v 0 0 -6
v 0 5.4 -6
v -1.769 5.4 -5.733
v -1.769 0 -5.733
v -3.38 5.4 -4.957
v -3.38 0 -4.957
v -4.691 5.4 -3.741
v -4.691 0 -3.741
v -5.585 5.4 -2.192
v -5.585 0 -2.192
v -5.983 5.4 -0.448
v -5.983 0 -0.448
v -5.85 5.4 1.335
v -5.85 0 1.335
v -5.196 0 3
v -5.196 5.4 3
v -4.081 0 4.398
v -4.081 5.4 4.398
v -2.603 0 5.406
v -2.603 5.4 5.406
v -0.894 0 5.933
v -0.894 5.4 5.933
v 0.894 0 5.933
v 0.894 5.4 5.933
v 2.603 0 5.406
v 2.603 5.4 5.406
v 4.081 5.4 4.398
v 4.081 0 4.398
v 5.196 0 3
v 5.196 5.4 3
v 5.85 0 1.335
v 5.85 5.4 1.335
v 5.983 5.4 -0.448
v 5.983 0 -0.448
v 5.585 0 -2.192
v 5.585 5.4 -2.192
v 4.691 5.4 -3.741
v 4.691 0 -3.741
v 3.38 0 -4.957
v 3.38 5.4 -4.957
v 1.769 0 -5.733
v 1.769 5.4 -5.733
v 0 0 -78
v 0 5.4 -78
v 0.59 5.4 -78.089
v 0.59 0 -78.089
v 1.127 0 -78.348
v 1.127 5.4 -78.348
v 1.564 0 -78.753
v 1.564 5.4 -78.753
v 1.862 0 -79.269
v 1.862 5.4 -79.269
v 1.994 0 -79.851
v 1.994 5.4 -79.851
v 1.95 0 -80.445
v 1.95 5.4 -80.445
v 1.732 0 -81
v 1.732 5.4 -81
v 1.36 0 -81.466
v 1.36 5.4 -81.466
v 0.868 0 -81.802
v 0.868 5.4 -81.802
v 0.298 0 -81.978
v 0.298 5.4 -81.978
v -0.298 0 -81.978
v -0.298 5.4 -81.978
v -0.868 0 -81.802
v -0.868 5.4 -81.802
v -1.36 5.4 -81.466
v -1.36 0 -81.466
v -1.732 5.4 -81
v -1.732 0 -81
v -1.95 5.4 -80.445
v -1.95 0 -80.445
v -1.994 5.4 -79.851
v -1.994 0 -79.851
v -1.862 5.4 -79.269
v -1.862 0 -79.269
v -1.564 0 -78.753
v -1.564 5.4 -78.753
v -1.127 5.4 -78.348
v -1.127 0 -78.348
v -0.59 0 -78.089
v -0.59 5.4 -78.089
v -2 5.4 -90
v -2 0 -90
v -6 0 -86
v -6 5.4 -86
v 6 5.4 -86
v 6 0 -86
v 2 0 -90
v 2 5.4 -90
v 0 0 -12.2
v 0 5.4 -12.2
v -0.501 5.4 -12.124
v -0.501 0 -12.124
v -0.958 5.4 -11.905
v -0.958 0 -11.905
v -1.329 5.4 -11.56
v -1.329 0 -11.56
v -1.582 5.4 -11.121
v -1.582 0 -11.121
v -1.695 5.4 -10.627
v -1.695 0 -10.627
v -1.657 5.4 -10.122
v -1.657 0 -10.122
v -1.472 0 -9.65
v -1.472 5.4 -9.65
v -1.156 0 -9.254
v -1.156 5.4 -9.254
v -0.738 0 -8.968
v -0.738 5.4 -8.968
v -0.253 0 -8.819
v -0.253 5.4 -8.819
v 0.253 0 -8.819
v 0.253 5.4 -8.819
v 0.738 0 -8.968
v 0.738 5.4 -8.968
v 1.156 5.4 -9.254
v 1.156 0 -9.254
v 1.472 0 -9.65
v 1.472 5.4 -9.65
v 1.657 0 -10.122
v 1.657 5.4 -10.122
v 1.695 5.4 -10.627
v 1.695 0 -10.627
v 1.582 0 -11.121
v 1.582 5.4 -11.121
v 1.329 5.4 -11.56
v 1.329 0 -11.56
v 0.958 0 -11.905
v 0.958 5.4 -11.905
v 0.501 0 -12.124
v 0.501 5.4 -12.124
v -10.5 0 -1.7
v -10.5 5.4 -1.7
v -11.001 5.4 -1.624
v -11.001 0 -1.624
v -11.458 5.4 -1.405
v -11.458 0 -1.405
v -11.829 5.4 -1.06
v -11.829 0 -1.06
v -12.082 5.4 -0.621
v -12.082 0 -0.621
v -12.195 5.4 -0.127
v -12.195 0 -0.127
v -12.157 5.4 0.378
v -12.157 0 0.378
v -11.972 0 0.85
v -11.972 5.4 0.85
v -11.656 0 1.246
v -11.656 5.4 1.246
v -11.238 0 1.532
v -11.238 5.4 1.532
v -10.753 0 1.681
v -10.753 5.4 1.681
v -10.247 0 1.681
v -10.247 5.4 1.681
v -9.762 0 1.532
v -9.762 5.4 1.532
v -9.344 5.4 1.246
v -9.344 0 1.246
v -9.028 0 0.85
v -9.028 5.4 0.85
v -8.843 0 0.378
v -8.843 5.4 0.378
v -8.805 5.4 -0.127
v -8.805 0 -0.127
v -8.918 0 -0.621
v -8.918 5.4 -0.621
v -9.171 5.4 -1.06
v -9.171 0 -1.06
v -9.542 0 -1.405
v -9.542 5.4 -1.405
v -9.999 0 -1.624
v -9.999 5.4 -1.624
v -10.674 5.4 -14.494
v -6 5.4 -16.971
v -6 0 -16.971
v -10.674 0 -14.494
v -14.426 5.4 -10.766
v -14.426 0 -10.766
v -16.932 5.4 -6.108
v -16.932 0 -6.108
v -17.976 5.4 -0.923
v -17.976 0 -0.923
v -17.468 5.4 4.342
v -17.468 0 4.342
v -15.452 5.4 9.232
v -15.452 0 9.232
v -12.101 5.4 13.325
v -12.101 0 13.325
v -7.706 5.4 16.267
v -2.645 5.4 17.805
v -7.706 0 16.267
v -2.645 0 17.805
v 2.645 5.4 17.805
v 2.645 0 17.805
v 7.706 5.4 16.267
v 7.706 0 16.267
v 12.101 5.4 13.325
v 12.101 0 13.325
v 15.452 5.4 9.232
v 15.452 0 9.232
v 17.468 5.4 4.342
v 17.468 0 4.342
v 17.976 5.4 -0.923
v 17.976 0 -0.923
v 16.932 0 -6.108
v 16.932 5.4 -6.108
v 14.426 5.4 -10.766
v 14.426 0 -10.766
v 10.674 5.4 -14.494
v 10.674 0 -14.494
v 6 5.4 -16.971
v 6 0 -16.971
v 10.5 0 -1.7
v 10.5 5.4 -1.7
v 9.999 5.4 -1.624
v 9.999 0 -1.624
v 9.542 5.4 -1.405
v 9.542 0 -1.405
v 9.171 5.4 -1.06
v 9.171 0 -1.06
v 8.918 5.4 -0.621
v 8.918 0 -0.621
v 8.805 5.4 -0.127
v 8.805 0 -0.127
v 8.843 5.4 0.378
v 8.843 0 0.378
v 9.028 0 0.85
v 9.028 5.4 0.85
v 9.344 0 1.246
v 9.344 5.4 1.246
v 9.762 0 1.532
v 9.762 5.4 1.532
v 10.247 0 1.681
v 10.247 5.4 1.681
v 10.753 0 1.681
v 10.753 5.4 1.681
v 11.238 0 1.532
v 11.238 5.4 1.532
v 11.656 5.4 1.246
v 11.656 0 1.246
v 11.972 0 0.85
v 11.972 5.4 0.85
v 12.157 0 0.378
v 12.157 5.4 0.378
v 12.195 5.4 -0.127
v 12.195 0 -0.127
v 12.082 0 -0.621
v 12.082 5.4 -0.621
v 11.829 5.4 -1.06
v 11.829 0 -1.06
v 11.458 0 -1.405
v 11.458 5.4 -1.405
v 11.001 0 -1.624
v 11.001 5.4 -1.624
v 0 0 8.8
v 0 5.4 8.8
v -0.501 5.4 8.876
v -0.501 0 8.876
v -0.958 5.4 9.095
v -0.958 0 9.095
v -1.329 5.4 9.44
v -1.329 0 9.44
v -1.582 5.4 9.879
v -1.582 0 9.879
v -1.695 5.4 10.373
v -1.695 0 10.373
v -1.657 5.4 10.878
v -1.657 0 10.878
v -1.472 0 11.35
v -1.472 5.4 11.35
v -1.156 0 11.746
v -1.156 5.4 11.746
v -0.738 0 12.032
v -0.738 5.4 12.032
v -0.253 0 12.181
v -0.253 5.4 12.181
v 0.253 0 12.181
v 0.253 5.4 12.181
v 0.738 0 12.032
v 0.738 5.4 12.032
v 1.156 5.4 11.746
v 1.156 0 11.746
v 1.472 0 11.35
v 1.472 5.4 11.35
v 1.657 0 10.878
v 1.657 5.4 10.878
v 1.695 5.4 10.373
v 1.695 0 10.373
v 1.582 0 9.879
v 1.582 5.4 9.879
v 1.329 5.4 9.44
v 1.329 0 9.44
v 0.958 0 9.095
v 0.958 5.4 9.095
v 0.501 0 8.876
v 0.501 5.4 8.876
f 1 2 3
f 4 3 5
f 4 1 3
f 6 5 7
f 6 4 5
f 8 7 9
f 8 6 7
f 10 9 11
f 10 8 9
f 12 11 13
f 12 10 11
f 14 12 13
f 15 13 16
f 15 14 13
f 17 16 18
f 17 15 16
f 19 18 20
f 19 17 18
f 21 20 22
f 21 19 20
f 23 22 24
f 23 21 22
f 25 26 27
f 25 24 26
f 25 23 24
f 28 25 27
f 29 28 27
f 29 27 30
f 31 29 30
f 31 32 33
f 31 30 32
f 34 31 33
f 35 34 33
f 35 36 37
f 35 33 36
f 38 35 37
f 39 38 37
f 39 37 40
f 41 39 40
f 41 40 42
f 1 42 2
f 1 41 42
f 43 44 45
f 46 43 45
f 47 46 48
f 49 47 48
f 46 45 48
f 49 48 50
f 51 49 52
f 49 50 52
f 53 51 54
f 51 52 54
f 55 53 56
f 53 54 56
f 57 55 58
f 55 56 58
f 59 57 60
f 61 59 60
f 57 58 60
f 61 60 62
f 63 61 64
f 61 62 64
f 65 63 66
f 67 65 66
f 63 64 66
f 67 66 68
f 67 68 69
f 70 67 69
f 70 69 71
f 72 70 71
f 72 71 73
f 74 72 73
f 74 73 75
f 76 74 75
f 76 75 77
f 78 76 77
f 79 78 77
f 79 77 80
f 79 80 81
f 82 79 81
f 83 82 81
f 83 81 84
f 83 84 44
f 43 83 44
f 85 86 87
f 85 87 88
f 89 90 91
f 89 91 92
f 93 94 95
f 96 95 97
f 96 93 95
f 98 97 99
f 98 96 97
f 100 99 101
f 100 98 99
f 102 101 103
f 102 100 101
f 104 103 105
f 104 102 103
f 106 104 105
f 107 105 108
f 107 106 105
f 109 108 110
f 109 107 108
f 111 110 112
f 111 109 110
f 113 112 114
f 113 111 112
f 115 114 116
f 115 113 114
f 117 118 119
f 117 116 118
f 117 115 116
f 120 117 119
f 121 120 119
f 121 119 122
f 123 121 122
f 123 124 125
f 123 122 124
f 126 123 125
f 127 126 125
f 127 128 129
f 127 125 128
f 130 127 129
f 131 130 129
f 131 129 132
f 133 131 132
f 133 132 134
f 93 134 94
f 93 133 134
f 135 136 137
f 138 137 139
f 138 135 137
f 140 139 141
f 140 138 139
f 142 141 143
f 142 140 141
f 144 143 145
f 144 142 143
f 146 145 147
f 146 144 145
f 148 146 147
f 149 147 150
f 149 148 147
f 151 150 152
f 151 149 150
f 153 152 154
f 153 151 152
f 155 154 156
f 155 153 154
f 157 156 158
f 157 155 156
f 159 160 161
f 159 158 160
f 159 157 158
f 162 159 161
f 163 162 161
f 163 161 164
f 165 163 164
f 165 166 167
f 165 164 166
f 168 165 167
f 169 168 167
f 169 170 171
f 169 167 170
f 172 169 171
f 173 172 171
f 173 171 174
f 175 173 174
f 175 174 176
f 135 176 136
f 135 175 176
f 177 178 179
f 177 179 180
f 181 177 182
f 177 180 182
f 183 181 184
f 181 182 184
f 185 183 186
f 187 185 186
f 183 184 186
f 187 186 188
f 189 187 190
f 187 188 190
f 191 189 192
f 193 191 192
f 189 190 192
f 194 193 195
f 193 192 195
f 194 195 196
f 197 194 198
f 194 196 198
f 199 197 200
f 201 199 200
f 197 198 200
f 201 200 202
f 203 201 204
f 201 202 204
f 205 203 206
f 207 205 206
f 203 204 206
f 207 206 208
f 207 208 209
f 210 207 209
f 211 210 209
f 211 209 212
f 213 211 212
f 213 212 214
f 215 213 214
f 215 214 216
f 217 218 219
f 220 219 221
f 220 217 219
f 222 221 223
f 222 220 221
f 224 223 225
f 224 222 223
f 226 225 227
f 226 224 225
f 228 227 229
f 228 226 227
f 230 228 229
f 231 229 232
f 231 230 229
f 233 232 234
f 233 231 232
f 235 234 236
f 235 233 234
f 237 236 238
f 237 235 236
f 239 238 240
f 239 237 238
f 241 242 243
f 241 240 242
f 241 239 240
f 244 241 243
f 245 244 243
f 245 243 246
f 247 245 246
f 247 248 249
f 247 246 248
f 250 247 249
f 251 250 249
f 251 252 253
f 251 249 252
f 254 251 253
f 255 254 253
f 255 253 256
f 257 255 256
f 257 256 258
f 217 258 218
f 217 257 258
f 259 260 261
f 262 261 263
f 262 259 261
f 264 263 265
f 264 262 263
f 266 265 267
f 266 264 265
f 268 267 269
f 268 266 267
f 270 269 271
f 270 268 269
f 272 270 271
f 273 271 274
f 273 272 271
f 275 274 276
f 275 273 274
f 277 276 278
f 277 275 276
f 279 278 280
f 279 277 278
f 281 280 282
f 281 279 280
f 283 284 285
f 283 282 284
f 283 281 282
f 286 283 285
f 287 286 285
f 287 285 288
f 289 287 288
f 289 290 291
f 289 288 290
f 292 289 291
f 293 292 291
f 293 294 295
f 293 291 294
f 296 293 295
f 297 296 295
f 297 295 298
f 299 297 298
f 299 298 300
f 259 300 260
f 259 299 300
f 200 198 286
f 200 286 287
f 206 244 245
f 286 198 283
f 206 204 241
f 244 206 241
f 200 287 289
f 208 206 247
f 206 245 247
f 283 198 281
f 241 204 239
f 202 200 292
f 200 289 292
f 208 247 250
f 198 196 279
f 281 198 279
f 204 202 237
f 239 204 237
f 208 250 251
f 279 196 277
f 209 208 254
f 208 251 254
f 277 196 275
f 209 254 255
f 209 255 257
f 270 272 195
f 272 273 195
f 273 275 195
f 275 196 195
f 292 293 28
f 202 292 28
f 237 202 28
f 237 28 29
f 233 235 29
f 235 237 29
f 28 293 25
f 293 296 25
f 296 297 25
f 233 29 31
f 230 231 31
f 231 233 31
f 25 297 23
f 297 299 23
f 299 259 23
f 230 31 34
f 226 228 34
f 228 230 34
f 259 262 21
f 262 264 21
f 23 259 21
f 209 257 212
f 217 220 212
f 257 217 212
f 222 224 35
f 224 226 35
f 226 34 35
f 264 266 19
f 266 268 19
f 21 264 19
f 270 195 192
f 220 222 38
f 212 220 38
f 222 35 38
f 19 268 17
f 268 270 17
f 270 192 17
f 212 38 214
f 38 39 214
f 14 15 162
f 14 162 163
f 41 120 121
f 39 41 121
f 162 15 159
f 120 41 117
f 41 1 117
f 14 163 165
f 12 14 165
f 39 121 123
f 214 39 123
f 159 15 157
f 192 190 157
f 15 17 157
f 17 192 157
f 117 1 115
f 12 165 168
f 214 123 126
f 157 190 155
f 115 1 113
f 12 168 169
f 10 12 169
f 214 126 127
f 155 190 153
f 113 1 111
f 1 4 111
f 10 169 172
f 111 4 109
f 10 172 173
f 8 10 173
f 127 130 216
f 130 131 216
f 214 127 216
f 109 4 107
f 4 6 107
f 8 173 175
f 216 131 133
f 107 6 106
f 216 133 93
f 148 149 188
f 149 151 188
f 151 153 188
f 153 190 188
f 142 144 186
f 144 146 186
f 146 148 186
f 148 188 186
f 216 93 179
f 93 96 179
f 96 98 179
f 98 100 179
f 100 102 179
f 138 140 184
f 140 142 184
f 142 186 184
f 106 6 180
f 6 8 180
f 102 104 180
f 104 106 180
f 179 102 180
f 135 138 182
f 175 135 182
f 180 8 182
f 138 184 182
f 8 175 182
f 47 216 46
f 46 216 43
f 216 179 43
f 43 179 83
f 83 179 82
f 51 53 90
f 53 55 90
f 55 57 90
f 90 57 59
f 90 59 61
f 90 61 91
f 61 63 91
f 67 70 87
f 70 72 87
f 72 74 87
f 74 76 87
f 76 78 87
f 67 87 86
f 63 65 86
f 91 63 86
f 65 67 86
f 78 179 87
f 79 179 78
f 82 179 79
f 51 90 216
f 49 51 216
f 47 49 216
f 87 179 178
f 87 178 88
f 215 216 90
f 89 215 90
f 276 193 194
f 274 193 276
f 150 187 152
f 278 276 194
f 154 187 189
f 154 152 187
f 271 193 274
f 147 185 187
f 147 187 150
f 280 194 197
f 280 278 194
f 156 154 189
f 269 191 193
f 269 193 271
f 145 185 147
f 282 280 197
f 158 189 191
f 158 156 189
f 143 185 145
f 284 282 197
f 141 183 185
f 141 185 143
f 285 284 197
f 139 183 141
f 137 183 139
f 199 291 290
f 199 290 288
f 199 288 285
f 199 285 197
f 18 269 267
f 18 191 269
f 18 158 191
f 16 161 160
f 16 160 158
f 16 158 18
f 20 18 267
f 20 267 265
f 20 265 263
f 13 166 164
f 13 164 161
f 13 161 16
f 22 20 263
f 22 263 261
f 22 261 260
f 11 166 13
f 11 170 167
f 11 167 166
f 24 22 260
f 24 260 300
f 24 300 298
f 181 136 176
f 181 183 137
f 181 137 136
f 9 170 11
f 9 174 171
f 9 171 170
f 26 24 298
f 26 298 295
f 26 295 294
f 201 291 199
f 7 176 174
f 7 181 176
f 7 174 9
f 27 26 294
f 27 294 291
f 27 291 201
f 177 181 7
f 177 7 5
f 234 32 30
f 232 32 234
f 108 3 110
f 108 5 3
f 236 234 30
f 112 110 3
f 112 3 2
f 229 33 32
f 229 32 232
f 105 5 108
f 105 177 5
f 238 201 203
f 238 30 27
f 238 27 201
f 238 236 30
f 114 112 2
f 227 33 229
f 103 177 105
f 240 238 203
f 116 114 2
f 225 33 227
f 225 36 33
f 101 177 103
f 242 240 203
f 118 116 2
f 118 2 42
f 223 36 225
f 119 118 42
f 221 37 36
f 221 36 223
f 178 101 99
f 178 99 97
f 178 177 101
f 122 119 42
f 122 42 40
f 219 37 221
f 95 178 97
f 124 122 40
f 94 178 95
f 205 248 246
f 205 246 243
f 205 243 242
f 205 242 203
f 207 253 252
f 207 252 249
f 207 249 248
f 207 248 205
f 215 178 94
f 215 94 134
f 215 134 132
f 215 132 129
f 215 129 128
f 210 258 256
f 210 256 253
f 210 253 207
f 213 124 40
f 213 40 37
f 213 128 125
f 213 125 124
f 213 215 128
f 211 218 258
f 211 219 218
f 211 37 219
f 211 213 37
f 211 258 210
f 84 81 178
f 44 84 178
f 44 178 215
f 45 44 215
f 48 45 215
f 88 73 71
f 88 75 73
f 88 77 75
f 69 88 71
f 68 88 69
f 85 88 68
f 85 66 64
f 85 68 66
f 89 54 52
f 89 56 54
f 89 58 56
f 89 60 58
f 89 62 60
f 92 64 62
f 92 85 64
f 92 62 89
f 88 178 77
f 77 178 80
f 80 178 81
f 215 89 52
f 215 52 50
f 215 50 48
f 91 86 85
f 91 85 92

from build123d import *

# Parameters (mm, degrees)
SKETCH1_R           = 18
BOSS_EXTRUDE2_DEPTH = 5.4
SKETCH2_W           = 12
SKETCH2_H           = 90
BOSS_EXTRUDE3_DEPTH = 5.4
SKETCH3_R           = 1.7
SKETCH3_R_2         = 6
CUT_EXTRUDE1_DEPTH  = 92.941068082
CHAMFER1_SIZE       = 4
SKETCH4_R           = 2
CUT_EXTRUDE2_DEPTH  = 92.941068082


with BuildPart() as part:
    # Sketch1 → Boss-Extrude2 (new body)
    with BuildSketch(Plane(origin=(0, 0, 0), x_dir=(1, 0, 0), z_dir=(0, 1, 0))):
        with Locations(Location((0, 0, 0), (0, 0, 90))):
            Circle(SKETCH1_R)
    extrude(amount=BOSS_EXTRUDE2_DEPTH)

    # Sketch2 → Boss-Extrude3 (add)
    with BuildSketch(Plane(origin=(0, 0, 0), x_dir=(1, 0, 0), z_dir=(0, 1, 0))):
        with Locations((0, 45)):
            Rectangle(SKETCH2_W, SKETCH2_H)
    extrude(amount=BOSS_EXTRUDE3_DEPTH)

    # Sketch3 → Cut-Extrude1 (cut, through all)
    with BuildSketch(Plane(origin=(0, 0, 0), x_dir=(1, 0, 0), z_dir=(0, 1, 0))):
        with Locations(Location((10.5, 0, 0), (0, 0, 90))):
            Circle(SKETCH3_R)
        with Locations(Location((0, 0, 0), (0, 0, 90))):
            Circle(SKETCH3_R_2)
        with Locations(Location((0, -10.5, 0), (0, 0, 90))):
            Circle(SKETCH3_R)
        with Locations(Location((-10.5, 0, 0), (0, 0, 90))):
            Circle(SKETCH3_R)
        with Locations(Location((0, 10.5, 0), (0, 0, 90))):
            Circle(SKETCH3_R)
    extrude(amount=CUT_EXTRUDE1_DEPTH, mode=Mode.SUBTRACT)

    # Chamfer1
    chamfer1_edges = [part.edges().sort_by_distance(p)[0] for p in [
        (-6, 2.7, -90),
        (6, 2.7, -90),
    ]]
    chamfer(chamfer1_edges, length=CHAMFER1_SIZE)

    # Sketch4 → Cut-Extrude2 (cut, through all)
    with BuildSketch(Plane(origin=(0, 5.4, 0), x_dir=(1, 0, 0), z_dir=(0, 1, 0))):
        with Locations(Location((0, 80, 0), (0, 0, 270))):
            Circle(SKETCH4_R)
    extrude(amount=-CUT_EXTRUDE2_DEPTH, mode=Mode.SUBTRACT)


solid = part.part
